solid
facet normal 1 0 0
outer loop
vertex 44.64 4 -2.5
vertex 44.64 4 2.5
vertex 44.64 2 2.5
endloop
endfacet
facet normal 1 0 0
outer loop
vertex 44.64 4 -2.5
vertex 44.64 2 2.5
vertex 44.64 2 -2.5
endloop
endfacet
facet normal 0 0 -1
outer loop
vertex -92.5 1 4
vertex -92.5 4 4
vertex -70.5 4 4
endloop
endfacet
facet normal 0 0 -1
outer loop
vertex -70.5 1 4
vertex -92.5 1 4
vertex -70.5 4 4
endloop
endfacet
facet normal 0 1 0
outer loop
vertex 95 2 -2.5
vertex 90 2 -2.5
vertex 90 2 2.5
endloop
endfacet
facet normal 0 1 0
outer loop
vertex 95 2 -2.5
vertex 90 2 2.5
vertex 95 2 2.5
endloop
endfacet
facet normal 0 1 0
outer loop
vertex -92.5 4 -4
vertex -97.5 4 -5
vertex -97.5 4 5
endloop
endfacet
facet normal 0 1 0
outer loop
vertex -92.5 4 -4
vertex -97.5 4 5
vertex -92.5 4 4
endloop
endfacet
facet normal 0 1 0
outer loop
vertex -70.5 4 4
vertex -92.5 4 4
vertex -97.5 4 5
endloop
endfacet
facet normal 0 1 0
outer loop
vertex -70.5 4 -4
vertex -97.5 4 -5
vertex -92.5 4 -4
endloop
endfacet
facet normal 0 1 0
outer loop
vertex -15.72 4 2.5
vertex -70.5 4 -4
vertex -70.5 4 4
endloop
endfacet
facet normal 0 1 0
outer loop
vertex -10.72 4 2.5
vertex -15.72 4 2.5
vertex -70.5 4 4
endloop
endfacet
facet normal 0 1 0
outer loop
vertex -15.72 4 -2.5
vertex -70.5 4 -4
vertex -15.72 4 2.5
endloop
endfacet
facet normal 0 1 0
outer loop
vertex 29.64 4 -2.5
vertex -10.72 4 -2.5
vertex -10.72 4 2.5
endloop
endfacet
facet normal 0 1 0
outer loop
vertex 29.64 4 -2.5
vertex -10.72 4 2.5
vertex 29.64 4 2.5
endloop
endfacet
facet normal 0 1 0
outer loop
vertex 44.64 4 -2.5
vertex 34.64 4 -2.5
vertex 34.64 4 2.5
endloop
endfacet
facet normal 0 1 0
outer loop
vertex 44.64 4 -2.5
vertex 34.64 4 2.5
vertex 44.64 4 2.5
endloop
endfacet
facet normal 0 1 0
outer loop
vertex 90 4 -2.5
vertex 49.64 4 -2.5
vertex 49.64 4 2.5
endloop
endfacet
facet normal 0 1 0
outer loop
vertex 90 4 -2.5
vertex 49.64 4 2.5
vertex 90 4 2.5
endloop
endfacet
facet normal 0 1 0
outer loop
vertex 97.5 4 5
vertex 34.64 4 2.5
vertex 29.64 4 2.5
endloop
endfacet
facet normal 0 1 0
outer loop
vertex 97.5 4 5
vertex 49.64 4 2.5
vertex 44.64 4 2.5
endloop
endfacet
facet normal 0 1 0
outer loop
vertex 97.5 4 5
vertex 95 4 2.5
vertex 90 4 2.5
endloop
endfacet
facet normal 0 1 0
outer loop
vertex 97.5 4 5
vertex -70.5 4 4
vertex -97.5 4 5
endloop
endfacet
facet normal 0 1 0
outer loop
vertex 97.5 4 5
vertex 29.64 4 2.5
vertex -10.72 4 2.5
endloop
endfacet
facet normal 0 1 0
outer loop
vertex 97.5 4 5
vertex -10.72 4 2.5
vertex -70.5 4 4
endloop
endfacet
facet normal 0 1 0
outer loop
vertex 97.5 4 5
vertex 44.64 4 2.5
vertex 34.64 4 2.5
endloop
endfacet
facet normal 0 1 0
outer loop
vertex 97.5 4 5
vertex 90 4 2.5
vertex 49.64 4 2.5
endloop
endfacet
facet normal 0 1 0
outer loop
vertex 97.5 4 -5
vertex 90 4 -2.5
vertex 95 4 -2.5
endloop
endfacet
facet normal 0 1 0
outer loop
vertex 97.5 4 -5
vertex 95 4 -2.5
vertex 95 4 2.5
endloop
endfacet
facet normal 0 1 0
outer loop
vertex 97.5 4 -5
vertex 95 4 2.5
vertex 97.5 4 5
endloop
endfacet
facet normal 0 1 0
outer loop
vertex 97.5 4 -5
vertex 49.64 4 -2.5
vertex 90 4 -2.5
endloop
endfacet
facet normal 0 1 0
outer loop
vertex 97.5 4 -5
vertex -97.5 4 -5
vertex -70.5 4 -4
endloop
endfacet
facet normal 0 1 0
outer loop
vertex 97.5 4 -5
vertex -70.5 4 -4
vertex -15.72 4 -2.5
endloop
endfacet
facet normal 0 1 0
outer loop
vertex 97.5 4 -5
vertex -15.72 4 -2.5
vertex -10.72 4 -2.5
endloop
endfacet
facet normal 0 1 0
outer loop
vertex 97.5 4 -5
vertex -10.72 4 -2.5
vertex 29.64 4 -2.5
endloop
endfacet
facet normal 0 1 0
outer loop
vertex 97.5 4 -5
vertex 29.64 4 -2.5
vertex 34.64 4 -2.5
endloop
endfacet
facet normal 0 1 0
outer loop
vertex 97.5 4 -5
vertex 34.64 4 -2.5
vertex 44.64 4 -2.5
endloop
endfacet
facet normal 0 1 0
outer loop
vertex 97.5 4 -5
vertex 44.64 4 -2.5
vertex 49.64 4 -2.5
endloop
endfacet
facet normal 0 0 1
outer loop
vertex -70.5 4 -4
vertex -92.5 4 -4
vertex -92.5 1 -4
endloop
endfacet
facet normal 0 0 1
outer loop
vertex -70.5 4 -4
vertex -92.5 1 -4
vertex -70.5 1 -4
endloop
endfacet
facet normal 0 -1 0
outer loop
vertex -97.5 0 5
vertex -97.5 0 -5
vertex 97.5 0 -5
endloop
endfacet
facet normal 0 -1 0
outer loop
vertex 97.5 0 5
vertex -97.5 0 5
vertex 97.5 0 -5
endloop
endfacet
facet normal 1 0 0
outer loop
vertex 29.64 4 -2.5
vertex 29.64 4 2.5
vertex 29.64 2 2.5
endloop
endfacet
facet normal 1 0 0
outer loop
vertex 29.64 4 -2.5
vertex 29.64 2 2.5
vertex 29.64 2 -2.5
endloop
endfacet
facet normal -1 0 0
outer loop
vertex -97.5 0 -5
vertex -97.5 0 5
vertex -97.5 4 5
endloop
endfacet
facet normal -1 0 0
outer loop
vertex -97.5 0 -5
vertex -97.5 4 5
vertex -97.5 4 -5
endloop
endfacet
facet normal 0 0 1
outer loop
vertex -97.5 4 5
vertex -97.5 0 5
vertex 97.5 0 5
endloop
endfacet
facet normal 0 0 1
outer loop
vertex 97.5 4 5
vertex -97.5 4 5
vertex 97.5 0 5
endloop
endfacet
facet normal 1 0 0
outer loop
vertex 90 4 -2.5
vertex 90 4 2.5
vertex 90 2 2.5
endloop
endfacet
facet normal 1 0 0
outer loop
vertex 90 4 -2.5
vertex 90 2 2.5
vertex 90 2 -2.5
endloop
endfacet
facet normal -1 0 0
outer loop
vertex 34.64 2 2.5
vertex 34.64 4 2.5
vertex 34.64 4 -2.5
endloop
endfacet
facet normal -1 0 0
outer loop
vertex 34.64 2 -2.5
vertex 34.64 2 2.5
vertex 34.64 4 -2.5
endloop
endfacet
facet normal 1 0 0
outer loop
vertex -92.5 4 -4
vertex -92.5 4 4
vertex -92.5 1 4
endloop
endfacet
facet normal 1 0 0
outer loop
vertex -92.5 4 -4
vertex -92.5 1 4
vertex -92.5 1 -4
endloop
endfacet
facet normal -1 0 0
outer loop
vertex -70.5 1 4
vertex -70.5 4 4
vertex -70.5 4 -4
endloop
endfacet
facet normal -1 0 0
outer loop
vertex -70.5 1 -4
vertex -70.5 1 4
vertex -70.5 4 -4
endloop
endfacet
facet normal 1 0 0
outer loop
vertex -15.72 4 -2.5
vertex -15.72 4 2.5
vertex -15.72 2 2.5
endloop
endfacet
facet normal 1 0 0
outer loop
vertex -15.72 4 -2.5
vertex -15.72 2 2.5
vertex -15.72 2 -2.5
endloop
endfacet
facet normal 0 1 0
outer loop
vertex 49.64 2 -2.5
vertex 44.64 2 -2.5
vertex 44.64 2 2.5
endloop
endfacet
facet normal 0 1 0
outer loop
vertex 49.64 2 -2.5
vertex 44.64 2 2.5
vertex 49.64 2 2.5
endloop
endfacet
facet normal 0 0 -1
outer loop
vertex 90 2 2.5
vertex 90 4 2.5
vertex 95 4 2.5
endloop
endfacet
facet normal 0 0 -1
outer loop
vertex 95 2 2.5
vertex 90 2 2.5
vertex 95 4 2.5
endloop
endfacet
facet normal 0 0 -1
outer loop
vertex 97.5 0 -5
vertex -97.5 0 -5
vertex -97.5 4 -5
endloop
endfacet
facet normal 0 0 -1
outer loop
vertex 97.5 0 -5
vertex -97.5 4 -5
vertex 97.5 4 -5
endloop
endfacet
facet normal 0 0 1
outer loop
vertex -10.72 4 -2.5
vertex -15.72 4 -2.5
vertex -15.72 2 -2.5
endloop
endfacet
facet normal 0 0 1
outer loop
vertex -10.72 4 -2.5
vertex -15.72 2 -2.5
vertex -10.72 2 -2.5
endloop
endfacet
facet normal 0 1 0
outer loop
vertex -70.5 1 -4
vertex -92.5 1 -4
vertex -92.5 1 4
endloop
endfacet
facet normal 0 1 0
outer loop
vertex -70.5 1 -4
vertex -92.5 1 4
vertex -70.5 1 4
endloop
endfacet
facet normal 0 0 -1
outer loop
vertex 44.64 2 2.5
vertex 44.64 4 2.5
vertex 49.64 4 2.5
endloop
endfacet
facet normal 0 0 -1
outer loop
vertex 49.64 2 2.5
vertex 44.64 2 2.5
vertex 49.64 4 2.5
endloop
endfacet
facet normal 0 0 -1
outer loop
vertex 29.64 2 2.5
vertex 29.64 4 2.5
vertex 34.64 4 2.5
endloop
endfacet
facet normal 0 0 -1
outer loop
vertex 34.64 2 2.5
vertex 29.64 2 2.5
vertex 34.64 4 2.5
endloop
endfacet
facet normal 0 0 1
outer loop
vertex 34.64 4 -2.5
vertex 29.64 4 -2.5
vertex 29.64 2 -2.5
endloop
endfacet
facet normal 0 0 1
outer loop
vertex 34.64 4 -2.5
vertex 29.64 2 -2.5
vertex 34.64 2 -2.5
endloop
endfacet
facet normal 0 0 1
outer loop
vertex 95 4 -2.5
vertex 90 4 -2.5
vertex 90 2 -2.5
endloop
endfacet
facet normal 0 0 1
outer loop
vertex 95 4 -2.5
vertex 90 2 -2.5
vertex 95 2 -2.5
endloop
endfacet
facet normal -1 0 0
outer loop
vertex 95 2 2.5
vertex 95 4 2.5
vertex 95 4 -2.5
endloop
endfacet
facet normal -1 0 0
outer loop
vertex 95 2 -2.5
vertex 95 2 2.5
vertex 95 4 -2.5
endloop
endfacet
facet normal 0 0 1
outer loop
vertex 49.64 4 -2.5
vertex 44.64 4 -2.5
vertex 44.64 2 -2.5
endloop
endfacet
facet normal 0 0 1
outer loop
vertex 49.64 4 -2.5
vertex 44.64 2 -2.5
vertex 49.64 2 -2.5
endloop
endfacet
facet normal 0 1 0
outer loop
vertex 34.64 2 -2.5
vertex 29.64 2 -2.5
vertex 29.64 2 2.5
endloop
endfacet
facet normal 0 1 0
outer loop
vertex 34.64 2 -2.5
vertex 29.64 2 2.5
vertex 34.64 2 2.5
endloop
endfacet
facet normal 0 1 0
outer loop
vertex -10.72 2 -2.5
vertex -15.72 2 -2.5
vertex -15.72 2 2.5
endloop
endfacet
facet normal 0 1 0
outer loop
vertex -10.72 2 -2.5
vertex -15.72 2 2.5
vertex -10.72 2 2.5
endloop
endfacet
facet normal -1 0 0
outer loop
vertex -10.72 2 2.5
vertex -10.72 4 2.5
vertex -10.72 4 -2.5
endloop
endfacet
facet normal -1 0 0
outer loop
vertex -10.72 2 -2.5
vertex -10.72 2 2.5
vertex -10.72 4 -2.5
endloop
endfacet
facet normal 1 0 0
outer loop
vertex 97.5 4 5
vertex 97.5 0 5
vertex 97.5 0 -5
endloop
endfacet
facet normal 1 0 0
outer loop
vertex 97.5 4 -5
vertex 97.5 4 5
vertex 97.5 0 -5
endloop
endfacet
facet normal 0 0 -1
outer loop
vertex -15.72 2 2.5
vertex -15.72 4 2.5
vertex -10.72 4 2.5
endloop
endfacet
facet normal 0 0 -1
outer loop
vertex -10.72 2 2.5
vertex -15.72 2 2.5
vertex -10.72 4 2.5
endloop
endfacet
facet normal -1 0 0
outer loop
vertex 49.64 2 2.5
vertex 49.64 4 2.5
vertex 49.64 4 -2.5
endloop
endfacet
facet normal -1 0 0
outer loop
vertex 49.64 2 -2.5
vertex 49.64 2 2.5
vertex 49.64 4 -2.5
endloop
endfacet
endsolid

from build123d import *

# Parameters (mm, degrees)
SKETCH_1_W          = 195
SKETCH_1_H          = 10
EXTRUDE_1_DEPTH     = 4
SKETCH_2_W          = 22
SKETCH_2_H          = 8
CUT_EXTRUDE_1_DEPTH = 3
SKETCH_3_W          = 5
SKETCH_3_H          = 5
CUT_EXTRUDE_2_DEPTH = 2


with BuildPart() as part:
    # 草图1 → 凸台-拉伸1 (new body)
    with BuildSketch(Plane(origin=(0, 0, 0), x_dir=(1, 0, 0), z_dir=(0, 1, 0))):
        Rectangle(SKETCH_1_W, SKETCH_1_H)
    extrude(amount=EXTRUDE_1_DEPTH)

    # 草图2 → 切除-拉伸1 (cut)
    with BuildSketch(Plane(origin=(0, 4, 0), x_dir=(1, 0, 0), z_dir=(0, 1, 0))):
        with Locations((-81.5, 0)):
            Rectangle(SKETCH_2_W, SKETCH_2_H)
    extrude(amount=-CUT_EXTRUDE_1_DEPTH, mode=Mode.SUBTRACT)

    # 草图3 → 切除-拉伸2 (cut)
    with BuildSketch(Plane(origin=(0, 4, 0), x_dir=(1, 0, 0), z_dir=(0, 1, 0))):
        with Locations((92.5, 0)):
            Rectangle(SKETCH_3_W, SKETCH_3_H)
        with Locations((47.14, 0)):
            Rectangle(SKETCH_3_W, SKETCH_3_H)
        with Locations((-13.22, 0)):
            Rectangle(SKETCH_3_W, SKETCH_3_H)
        with Locations((32.14, 0)):
            Rectangle(SKETCH_3_W, SKETCH_3_H)
    extrude(amount=-CUT_EXTRUDE_2_DEPTH, mode=Mode.SUBTRACT)


solid = part.part
